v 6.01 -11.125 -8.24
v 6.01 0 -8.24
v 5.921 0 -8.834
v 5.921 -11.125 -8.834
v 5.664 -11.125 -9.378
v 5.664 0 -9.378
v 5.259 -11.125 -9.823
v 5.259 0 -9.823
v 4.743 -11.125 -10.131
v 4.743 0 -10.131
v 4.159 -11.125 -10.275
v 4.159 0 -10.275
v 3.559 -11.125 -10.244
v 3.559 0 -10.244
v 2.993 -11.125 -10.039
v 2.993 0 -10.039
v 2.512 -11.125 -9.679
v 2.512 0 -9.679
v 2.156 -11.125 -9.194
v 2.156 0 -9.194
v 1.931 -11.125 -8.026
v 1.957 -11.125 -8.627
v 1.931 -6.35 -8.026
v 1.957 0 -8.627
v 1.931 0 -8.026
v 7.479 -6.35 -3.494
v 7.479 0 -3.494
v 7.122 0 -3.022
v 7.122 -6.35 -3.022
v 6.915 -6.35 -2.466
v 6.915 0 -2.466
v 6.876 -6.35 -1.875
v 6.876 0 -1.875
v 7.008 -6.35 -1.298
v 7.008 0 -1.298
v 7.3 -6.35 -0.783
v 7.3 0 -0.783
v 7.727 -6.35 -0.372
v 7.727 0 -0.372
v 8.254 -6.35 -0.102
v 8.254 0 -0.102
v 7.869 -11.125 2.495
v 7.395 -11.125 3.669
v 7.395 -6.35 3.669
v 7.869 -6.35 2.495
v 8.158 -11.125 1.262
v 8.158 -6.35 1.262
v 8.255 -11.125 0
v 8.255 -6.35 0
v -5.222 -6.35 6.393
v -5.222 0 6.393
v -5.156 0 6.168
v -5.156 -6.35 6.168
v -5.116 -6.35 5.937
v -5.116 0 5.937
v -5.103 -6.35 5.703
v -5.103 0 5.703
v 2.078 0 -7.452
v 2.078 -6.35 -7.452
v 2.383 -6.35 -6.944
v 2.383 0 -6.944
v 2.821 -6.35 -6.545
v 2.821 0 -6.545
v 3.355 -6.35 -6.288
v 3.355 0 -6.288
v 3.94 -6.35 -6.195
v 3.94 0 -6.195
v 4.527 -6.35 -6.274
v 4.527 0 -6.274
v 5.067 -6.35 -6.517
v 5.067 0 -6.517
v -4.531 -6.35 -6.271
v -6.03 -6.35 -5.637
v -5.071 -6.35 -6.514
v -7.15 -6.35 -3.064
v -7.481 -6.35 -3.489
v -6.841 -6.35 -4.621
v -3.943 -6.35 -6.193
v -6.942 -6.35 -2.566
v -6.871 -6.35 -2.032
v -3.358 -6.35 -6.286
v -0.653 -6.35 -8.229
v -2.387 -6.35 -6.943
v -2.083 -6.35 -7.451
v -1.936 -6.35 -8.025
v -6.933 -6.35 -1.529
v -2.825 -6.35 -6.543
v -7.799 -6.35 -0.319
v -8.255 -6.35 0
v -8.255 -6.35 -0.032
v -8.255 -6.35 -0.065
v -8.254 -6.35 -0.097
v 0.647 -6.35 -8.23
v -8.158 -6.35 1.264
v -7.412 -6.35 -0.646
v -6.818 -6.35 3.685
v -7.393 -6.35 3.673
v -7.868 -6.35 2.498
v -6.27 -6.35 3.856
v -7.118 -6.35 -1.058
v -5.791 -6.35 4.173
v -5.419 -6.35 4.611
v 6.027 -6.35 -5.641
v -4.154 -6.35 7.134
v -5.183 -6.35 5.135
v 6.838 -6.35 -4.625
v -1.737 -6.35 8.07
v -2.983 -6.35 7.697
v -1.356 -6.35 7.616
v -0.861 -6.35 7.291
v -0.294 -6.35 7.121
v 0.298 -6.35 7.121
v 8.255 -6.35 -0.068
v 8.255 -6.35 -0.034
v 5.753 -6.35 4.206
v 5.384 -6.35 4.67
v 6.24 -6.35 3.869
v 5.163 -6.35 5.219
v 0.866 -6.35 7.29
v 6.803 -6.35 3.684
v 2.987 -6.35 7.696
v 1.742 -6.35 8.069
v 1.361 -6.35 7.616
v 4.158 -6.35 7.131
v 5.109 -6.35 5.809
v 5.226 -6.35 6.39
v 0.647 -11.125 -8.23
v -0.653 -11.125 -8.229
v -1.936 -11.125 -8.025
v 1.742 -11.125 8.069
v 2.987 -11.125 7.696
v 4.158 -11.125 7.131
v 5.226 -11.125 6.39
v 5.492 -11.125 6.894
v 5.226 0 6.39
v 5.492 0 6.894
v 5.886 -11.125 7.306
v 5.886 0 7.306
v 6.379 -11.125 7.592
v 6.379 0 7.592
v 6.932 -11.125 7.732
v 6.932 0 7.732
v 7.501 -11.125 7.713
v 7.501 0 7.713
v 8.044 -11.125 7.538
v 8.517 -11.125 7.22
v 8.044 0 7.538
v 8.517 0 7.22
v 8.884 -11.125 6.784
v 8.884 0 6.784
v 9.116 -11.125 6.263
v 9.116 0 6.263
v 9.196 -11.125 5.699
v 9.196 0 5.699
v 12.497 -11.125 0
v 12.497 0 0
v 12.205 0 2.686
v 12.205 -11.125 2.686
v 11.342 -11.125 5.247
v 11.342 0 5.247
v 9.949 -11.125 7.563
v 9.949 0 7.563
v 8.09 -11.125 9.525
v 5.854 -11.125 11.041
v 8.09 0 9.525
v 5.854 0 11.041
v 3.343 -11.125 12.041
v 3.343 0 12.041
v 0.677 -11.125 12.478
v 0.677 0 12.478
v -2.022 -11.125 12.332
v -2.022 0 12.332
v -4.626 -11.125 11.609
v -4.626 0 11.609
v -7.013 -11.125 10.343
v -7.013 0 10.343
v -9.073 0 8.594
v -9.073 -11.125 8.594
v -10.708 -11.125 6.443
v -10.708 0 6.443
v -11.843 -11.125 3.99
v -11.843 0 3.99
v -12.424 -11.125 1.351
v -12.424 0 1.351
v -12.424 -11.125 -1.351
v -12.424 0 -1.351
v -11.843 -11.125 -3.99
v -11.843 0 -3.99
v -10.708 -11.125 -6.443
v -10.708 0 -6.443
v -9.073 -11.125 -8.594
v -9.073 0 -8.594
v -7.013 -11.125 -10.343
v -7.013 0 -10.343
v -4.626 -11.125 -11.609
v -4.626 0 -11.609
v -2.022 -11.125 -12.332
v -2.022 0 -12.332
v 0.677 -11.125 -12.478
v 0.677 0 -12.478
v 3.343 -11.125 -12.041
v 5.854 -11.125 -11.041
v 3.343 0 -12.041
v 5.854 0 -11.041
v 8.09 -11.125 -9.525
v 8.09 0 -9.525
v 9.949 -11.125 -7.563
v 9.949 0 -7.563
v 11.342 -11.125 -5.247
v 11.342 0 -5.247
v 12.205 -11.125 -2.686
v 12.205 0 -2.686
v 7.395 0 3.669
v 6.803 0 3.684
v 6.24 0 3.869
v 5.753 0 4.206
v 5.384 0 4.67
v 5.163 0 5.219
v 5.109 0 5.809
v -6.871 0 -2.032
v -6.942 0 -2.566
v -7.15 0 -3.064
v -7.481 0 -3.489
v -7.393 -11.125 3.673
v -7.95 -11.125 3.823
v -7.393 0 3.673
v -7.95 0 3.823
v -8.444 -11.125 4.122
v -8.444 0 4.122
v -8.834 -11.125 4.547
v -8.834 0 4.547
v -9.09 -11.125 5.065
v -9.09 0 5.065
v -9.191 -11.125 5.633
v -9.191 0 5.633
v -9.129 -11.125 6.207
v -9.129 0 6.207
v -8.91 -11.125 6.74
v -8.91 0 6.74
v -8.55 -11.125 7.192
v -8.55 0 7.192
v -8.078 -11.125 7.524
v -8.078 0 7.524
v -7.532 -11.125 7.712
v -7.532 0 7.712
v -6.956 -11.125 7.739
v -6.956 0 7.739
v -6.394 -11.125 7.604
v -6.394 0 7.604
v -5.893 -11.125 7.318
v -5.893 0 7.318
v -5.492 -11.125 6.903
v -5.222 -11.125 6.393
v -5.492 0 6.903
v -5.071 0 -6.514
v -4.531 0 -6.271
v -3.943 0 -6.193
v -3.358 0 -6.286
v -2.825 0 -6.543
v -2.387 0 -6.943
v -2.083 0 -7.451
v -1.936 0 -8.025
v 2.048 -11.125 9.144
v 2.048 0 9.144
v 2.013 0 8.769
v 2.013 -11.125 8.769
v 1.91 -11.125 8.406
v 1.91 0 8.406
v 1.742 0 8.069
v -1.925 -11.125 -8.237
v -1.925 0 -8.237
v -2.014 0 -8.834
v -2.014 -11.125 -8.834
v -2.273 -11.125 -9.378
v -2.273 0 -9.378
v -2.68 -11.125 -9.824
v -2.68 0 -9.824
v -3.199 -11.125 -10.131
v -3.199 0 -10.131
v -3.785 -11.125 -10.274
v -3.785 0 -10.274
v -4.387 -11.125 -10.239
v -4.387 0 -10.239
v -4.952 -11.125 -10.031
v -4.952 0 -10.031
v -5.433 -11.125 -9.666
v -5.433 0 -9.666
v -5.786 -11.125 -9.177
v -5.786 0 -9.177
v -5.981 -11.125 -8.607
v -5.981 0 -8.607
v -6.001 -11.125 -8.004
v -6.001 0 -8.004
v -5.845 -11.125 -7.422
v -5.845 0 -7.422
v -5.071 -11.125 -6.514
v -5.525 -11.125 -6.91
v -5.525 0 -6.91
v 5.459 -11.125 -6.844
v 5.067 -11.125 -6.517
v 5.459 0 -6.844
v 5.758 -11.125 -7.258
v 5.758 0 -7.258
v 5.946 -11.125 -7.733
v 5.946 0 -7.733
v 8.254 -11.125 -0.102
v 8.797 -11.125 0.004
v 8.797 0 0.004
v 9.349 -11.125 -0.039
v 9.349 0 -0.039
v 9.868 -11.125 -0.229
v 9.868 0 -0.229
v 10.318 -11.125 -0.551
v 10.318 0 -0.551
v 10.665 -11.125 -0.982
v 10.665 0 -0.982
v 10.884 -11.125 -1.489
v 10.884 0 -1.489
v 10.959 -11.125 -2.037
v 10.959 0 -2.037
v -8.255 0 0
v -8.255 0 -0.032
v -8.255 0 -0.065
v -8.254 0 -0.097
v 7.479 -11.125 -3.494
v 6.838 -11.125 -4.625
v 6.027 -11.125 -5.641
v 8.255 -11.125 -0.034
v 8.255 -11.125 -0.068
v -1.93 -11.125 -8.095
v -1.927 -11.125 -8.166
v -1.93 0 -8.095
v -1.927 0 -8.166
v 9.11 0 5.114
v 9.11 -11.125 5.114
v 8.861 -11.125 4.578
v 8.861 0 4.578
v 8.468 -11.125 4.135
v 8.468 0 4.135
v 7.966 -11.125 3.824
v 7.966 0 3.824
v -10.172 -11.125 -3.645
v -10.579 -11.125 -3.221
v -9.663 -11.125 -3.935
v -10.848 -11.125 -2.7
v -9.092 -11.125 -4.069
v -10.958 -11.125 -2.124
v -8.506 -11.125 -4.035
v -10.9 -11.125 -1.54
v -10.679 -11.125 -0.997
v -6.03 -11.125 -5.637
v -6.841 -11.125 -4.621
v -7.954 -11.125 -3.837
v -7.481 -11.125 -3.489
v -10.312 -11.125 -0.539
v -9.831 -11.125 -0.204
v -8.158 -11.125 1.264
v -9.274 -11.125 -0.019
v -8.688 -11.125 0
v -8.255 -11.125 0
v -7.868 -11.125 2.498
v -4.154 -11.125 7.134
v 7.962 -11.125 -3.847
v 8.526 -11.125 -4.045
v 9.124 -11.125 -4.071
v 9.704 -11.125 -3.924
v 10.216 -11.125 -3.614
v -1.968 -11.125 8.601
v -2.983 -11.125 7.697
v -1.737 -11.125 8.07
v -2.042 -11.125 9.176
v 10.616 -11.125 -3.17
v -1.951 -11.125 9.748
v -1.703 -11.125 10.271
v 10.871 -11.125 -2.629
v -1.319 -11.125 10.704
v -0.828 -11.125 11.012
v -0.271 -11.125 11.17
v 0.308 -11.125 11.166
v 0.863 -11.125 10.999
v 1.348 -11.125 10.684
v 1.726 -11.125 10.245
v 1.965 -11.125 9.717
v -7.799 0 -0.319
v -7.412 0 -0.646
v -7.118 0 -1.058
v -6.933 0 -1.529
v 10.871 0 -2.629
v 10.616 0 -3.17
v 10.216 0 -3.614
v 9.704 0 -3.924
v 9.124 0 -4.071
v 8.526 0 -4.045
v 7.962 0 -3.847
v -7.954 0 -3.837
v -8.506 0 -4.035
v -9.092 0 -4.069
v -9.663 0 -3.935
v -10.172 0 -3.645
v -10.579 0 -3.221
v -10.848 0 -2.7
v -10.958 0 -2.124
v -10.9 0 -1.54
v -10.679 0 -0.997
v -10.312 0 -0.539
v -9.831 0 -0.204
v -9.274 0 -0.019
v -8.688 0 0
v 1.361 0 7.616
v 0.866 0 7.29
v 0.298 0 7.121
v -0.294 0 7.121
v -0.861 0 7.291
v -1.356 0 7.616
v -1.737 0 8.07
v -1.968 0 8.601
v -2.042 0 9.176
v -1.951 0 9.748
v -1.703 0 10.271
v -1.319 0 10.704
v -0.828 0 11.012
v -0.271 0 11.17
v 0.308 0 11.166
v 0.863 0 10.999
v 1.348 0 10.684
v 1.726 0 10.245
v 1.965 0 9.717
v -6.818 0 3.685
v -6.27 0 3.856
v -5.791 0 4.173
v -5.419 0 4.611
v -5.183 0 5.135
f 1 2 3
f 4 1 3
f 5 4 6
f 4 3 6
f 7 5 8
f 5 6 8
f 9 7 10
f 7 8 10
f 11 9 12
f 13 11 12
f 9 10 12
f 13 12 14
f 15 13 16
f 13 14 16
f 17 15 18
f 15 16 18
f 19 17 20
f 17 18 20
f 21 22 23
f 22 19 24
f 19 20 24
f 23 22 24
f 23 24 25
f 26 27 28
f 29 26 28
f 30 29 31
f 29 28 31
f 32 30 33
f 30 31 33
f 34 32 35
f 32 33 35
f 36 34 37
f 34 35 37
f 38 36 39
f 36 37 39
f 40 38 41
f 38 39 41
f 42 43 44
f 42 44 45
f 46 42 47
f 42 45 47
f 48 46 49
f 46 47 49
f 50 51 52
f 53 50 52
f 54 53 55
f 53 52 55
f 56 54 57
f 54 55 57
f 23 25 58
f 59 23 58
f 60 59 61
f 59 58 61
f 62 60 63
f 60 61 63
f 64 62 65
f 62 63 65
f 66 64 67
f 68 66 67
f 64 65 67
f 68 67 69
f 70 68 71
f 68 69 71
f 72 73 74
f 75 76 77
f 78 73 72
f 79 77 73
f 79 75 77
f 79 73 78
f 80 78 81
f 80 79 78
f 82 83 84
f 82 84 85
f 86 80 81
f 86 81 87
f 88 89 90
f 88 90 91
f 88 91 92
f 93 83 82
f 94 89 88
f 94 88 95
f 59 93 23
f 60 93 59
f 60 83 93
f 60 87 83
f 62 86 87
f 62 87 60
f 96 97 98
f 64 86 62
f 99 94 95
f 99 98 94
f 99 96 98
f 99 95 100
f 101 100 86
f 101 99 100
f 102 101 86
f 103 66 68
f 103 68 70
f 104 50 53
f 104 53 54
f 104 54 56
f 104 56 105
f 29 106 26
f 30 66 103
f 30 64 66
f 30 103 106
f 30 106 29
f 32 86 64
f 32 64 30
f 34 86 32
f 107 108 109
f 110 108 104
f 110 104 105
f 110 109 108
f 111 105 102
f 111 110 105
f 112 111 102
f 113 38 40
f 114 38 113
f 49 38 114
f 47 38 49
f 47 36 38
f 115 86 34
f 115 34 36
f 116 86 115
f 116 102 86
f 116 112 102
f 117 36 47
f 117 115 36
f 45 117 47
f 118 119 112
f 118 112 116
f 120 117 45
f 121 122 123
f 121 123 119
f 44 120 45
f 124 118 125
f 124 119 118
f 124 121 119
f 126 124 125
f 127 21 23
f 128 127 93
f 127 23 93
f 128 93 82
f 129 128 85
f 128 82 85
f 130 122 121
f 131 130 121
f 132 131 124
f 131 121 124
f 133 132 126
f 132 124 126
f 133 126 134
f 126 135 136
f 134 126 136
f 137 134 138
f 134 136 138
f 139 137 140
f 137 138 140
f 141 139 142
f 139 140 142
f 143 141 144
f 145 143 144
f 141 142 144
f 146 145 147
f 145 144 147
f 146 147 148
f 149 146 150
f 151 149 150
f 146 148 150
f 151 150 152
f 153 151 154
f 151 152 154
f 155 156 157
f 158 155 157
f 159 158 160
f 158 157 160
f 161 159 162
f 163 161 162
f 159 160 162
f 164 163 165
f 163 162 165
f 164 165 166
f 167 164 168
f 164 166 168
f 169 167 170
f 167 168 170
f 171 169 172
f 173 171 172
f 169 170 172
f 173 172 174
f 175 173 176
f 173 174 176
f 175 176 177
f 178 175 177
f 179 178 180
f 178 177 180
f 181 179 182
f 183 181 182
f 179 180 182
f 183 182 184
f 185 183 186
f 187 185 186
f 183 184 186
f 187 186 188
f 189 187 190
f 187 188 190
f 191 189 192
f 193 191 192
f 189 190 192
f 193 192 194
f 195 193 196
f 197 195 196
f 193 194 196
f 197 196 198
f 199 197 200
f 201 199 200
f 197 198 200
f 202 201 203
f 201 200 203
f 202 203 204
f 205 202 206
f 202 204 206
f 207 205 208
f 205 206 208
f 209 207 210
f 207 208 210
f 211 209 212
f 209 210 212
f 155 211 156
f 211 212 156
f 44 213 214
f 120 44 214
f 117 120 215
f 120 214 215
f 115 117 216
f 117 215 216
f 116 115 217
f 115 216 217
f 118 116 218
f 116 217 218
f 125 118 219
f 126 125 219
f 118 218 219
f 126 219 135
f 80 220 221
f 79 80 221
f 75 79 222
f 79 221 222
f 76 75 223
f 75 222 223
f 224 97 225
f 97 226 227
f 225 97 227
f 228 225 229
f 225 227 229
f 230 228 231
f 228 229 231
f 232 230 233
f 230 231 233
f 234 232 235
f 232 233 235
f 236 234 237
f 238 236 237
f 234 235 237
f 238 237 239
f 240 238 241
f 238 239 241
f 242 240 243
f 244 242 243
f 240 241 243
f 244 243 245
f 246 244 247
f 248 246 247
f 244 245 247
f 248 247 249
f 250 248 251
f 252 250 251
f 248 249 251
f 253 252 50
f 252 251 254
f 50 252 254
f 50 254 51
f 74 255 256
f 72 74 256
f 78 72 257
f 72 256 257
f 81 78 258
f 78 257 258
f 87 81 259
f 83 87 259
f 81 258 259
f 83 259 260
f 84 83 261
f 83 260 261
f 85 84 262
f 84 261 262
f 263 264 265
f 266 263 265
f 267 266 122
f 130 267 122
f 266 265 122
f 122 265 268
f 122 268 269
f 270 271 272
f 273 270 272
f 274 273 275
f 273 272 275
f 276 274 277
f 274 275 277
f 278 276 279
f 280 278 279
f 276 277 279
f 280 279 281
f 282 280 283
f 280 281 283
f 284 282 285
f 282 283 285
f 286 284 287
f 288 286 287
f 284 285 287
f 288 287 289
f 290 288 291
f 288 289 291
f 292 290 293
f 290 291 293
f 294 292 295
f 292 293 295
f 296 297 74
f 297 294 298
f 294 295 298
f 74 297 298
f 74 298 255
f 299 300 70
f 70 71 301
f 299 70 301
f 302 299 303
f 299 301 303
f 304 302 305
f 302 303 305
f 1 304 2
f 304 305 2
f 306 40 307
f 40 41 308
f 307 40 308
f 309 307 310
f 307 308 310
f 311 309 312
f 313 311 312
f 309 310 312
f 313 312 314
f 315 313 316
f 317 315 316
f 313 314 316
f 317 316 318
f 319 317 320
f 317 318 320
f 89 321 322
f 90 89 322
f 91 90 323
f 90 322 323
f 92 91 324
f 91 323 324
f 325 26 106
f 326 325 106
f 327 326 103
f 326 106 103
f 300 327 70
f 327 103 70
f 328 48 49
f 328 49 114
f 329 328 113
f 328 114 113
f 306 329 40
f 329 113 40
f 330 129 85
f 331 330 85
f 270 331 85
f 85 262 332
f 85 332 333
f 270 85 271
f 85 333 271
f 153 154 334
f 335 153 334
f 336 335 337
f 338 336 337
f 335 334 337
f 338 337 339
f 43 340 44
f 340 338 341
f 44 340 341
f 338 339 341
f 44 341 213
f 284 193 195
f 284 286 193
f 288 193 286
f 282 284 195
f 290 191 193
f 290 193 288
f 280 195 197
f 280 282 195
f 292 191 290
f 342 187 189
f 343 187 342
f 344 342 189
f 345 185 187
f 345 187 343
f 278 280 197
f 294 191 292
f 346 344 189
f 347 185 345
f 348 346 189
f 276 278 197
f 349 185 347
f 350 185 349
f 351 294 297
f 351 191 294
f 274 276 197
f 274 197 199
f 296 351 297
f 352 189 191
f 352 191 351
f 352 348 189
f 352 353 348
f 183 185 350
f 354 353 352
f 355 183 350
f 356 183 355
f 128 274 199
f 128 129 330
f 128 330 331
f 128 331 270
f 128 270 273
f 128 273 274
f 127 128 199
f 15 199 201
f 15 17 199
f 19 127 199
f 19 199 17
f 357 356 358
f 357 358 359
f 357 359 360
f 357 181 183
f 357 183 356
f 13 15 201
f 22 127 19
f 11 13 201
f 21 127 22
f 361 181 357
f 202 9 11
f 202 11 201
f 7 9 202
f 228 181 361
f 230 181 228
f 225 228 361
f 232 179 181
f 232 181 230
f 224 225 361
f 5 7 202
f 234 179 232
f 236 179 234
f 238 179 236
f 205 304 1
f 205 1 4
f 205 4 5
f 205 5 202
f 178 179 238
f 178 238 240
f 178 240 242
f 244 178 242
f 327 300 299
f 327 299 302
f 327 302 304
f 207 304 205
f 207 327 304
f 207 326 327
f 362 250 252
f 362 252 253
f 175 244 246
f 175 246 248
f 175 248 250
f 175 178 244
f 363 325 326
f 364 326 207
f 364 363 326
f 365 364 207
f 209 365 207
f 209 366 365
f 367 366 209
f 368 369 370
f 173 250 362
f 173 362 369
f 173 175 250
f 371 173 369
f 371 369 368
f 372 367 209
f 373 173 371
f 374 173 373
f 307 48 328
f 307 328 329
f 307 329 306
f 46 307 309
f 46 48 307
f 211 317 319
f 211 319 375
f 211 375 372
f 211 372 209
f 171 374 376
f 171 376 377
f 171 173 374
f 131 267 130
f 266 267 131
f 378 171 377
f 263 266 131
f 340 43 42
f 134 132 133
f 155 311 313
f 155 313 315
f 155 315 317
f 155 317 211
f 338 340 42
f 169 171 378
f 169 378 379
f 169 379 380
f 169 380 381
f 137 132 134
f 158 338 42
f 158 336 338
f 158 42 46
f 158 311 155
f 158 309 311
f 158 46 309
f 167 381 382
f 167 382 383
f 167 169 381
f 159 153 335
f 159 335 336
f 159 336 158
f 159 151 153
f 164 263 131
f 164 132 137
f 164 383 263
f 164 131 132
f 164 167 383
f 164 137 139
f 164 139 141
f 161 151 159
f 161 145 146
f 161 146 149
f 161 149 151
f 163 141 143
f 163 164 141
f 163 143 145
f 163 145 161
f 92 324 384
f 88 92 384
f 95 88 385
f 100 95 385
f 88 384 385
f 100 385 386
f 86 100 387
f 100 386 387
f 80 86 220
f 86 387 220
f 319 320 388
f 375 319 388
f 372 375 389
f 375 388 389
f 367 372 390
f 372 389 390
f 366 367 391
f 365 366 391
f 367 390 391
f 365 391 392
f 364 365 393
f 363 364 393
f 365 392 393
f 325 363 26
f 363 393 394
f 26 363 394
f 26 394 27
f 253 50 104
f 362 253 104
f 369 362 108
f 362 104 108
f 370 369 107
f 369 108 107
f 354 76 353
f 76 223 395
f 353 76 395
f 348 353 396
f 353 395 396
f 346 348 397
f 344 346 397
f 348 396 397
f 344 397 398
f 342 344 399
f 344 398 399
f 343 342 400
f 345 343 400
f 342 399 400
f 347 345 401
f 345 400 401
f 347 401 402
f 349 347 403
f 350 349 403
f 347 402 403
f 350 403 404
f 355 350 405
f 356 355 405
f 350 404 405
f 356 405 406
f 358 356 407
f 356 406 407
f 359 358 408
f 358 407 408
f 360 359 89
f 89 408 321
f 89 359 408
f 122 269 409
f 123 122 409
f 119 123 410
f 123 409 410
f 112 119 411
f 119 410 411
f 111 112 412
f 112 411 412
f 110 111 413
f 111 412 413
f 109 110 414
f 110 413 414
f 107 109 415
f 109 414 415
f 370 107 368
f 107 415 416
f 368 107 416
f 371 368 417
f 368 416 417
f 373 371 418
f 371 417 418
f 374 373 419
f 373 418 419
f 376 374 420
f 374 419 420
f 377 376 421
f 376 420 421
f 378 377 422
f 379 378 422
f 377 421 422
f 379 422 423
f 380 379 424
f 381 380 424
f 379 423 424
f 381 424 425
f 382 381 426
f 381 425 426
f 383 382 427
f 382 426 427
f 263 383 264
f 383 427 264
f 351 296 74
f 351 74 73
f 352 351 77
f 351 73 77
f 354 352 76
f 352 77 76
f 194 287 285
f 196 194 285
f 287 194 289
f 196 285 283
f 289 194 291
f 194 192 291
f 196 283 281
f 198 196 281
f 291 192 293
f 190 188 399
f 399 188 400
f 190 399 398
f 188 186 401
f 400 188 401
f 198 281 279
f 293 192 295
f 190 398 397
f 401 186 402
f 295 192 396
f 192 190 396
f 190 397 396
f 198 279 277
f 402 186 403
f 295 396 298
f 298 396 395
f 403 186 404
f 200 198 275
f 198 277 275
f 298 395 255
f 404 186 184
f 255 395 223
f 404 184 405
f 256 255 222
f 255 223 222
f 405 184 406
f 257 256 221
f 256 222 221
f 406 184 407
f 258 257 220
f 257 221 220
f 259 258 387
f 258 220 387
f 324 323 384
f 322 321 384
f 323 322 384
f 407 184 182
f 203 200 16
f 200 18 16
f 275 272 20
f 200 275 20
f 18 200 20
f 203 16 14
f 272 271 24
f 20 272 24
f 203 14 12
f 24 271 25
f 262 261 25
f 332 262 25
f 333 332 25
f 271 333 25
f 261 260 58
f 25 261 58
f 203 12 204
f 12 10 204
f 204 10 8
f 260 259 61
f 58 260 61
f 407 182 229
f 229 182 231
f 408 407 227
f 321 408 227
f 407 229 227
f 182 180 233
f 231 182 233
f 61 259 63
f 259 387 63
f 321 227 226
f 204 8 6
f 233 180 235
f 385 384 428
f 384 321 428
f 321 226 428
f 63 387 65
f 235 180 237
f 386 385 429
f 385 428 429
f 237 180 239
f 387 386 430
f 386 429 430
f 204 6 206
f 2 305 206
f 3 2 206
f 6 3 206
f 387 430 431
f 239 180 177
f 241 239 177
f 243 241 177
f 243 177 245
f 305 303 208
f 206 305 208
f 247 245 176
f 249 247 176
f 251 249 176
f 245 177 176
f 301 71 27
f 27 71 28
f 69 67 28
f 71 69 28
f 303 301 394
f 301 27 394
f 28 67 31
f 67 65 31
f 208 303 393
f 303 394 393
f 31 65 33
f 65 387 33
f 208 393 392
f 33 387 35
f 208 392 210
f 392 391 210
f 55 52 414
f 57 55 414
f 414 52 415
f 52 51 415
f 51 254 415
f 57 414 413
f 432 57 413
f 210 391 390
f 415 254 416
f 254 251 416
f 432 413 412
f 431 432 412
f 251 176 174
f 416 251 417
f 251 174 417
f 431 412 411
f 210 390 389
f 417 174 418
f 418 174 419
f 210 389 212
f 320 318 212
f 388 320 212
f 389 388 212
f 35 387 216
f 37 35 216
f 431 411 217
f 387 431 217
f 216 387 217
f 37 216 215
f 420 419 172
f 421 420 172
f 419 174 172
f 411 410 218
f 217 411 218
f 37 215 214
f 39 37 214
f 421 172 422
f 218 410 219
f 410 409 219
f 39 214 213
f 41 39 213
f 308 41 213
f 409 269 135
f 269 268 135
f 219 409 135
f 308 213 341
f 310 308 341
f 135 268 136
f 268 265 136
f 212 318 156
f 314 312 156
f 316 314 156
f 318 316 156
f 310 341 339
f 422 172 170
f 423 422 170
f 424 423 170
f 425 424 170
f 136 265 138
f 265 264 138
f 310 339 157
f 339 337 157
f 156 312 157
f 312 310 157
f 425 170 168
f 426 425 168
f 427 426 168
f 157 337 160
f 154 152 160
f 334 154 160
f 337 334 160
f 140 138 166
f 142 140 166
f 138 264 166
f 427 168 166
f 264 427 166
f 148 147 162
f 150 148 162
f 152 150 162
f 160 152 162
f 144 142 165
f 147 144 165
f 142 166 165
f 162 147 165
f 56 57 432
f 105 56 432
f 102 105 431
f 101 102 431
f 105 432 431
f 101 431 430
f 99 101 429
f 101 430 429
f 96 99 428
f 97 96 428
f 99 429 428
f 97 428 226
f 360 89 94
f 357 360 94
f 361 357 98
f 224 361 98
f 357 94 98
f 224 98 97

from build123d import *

# Parameters (mm, degrees)
F0_R     = 12.4968
F1_DEPTH = 11.1252
F2_DEPTH = 6.35


with BuildPart() as f1:
    # F0 (on Front) → F1 (new body)
    with BuildSketch(Plane.XZ):
        Circle(F0_R)
        with BuildLine():
            ThreePointArc((7.394862, 3.668929), (8.037089, 1.884202), (8.255, 0))
            ThreePointArc((8.255, 0), (8.254842, -0.051077), (8.254368, -0.102152))
            ThreePointArc((8.254368, -0.102152), (10.104053, -0.374671), (10.95885, -2.037478))
            ThreePointArc((10.95885, -2.037478), (9.703631, -3.923616), (7.479105, -3.493997))
            ThreePointArc((7.479105, -3.493997), (6.452437, -5.148891), (5.066648, -6.517216))
            ThreePointArc((5.066648, -6.517216), (5.758448, -7.257852), (6.009617, -8.23971))
            ThreePointArc((6.009617, -8.23971), (3.85785, -10.281605), (1.931429, -8.025871))
            ThreePointArc((1.931429, -8.025871), (-0.002536, -8.255), (-1.936361, -8.024683))
            ThreePointArc((-1.936361, -8.024683), (-1.928052, -8.130833), (-1.925279, -8.237272))
            ThreePointArc((-1.925279, -8.237272), (-4.952388, -10.030501), (-5.070652, -6.514101))
            ThreePointArc((-5.070652, -6.514101), (-6.4556, -5.144925), (-7.481251, -3.4894))
            ThreePointArc((-7.481251, -3.4894), (-10.847828, -2.70022), (-8.687861, 0))
            Line((-8.687861, 0), (-8.255, 0))
            ThreePointArc((-8.255, 0), (-8.03651, 1.886672), (-7.392606, 3.673472))
            ThreePointArc((-7.392606, 3.673472), (-8.745562, 6.97875), (-5.222453, 6.393044))
            ThreePointArc((-5.222453, 6.393044), (-3.579425, 7.438598), (-1.737178, 8.070145))
            ThreePointArc((-1.737178, 8.070145), (-0.555332, 11.111082), (2.04751, 9.144035))
            ThreePointArc((2.04751, 9.144035), (1.969685, 8.585289), (1.742137, 8.069076))
            ThreePointArc((1.742137, 8.069076), (3.583995, 7.436397), (5.22638, 6.389834))
            ThreePointArc((5.22638, 6.389834), (7.501448, 7.713433), (9.195546, 5.699016))
            ThreePointArc((9.195546, 5.699016), (8.680509, 4.342207), (7.394862, 3.668929))
        make_face(mode=Mode.SUBTRACT)
    extrude(amount=F1_DEPTH)

    # F0 (on Front) → F2 (join)
    with BuildSketch(Plane.XZ):
        with BuildLine():
            ThreePointArc((8.254368, -0.102152), (8.254842, -0.051077), (8.255, 0))
            ThreePointArc((8.255, 0), (8.037089, 1.884202), (7.394862, 3.668929))
            ThreePointArc((7.394862, 3.668929), (5.551844, 4.424657), (5.22638, 6.389834))
            ThreePointArc((5.22638, 6.389834), (3.583995, 7.436397), (1.742137, 8.069076))
            ThreePointArc((1.742137, 8.069076), (0.002181, 7.099335), (-1.737178, 8.070145))
            ThreePointArc((-1.737178, 8.070145), (-3.579425, 7.438598), (-5.222453, 6.393044))
            ThreePointArc((-5.222453, 6.393044), (-5.132818, 6.053392), (-5.102643, 5.703409))
            ThreePointArc((-5.102643, 5.703409), (-5.791004, 4.173329), (-7.392606, 3.673472))
            ThreePointArc((-7.392606, 3.673472), (-8.03651, 1.886672), (-8.255, 0))
            Line((-8.255, 0), (0, 0))
            Line((0, 0), (0, -2.032))
            Line((0, -2.032), (-6.8707, -2.032))
            ThreePointArc((-6.8707, -2.032), (-7.029505, -2.822061), (-7.481251, -3.4894))
            ThreePointArc((-7.481251, -3.4894), (-6.4556, -5.144925), (-5.070652, -6.514101))
            ThreePointArc((-5.070652, -6.514101), (-3.082251, -6.395333), (-1.936361, -8.024683))
            ThreePointArc((-1.936361, -8.024683), (-0.002536, -8.255), (1.931429, -8.025871))
            ThreePointArc((1.931429, -8.025871), (3.078321, -6.397226), (5.066648, -6.517216))
            ThreePointArc((5.066648, -6.517216), (6.452437, -5.148891), (7.479105, -3.493997))
            ThreePointArc((7.479105, -3.493997), (6.920854, -1.581877), (8.254368, -0.102152))
        make_face()
        with BuildLine():
            Line((0, 0), (-8.255, 0))
            ThreePointArc((-8.255, 0), (-8.254857, -0.048541), (-8.254429, -0.09708))
            ThreePointArc((-8.254429, -0.09708), (-7.252228, -0.842607), (-6.8707, -2.032))
            Line((-6.8707, -2.032), (0, -2.032))
            Line((0, -2.032), (0, 0))
        make_face()
    extrude(amount=F2_DEPTH)


solid = f1.part
